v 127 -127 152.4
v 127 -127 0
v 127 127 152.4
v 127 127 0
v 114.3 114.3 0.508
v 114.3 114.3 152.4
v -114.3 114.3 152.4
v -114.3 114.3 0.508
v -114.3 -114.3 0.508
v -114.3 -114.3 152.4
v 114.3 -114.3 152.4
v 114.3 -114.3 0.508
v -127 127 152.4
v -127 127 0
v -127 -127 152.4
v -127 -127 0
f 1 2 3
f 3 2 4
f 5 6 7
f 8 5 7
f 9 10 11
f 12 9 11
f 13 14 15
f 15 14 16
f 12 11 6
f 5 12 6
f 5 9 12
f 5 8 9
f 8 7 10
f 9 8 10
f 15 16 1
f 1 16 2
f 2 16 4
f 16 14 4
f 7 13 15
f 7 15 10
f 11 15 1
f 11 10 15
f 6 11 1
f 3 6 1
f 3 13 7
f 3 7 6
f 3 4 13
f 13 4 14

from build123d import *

# Parameters (mm, degrees)
F1_DEPTH = 152.4
F3_DEPTH = 151.892


with BuildPart() as f1:
    # F0 (on Top) → F1 (new body)
    with BuildSketch(Plane.XY):
        Polygon((127, 0), (0, 0), (-127, 0), (-127, -127), (127, -127), align=None)
        Polygon((-127, 0), (0, 0), (127, 0), (127, 127), (-127, 127), align=None)
    extrude(amount=F1_DEPTH)

    # F2 (on face) → F3 (cut)
    with BuildSketch(Plane.XY.offset(152.4)):
        Polygon((114.3, 0), (0, 0), (-114.3, 0), (-114.3, -114.3), (114.3, -114.3), align=None)
        Polygon((-114.3, 0), (0, 0), (114.3, 0), (114.3, 114.3), (-114.3, 114.3), align=None)
    extrude(amount=-F3_DEPTH, mode=Mode.SUBTRACT)


solid = f1.part
